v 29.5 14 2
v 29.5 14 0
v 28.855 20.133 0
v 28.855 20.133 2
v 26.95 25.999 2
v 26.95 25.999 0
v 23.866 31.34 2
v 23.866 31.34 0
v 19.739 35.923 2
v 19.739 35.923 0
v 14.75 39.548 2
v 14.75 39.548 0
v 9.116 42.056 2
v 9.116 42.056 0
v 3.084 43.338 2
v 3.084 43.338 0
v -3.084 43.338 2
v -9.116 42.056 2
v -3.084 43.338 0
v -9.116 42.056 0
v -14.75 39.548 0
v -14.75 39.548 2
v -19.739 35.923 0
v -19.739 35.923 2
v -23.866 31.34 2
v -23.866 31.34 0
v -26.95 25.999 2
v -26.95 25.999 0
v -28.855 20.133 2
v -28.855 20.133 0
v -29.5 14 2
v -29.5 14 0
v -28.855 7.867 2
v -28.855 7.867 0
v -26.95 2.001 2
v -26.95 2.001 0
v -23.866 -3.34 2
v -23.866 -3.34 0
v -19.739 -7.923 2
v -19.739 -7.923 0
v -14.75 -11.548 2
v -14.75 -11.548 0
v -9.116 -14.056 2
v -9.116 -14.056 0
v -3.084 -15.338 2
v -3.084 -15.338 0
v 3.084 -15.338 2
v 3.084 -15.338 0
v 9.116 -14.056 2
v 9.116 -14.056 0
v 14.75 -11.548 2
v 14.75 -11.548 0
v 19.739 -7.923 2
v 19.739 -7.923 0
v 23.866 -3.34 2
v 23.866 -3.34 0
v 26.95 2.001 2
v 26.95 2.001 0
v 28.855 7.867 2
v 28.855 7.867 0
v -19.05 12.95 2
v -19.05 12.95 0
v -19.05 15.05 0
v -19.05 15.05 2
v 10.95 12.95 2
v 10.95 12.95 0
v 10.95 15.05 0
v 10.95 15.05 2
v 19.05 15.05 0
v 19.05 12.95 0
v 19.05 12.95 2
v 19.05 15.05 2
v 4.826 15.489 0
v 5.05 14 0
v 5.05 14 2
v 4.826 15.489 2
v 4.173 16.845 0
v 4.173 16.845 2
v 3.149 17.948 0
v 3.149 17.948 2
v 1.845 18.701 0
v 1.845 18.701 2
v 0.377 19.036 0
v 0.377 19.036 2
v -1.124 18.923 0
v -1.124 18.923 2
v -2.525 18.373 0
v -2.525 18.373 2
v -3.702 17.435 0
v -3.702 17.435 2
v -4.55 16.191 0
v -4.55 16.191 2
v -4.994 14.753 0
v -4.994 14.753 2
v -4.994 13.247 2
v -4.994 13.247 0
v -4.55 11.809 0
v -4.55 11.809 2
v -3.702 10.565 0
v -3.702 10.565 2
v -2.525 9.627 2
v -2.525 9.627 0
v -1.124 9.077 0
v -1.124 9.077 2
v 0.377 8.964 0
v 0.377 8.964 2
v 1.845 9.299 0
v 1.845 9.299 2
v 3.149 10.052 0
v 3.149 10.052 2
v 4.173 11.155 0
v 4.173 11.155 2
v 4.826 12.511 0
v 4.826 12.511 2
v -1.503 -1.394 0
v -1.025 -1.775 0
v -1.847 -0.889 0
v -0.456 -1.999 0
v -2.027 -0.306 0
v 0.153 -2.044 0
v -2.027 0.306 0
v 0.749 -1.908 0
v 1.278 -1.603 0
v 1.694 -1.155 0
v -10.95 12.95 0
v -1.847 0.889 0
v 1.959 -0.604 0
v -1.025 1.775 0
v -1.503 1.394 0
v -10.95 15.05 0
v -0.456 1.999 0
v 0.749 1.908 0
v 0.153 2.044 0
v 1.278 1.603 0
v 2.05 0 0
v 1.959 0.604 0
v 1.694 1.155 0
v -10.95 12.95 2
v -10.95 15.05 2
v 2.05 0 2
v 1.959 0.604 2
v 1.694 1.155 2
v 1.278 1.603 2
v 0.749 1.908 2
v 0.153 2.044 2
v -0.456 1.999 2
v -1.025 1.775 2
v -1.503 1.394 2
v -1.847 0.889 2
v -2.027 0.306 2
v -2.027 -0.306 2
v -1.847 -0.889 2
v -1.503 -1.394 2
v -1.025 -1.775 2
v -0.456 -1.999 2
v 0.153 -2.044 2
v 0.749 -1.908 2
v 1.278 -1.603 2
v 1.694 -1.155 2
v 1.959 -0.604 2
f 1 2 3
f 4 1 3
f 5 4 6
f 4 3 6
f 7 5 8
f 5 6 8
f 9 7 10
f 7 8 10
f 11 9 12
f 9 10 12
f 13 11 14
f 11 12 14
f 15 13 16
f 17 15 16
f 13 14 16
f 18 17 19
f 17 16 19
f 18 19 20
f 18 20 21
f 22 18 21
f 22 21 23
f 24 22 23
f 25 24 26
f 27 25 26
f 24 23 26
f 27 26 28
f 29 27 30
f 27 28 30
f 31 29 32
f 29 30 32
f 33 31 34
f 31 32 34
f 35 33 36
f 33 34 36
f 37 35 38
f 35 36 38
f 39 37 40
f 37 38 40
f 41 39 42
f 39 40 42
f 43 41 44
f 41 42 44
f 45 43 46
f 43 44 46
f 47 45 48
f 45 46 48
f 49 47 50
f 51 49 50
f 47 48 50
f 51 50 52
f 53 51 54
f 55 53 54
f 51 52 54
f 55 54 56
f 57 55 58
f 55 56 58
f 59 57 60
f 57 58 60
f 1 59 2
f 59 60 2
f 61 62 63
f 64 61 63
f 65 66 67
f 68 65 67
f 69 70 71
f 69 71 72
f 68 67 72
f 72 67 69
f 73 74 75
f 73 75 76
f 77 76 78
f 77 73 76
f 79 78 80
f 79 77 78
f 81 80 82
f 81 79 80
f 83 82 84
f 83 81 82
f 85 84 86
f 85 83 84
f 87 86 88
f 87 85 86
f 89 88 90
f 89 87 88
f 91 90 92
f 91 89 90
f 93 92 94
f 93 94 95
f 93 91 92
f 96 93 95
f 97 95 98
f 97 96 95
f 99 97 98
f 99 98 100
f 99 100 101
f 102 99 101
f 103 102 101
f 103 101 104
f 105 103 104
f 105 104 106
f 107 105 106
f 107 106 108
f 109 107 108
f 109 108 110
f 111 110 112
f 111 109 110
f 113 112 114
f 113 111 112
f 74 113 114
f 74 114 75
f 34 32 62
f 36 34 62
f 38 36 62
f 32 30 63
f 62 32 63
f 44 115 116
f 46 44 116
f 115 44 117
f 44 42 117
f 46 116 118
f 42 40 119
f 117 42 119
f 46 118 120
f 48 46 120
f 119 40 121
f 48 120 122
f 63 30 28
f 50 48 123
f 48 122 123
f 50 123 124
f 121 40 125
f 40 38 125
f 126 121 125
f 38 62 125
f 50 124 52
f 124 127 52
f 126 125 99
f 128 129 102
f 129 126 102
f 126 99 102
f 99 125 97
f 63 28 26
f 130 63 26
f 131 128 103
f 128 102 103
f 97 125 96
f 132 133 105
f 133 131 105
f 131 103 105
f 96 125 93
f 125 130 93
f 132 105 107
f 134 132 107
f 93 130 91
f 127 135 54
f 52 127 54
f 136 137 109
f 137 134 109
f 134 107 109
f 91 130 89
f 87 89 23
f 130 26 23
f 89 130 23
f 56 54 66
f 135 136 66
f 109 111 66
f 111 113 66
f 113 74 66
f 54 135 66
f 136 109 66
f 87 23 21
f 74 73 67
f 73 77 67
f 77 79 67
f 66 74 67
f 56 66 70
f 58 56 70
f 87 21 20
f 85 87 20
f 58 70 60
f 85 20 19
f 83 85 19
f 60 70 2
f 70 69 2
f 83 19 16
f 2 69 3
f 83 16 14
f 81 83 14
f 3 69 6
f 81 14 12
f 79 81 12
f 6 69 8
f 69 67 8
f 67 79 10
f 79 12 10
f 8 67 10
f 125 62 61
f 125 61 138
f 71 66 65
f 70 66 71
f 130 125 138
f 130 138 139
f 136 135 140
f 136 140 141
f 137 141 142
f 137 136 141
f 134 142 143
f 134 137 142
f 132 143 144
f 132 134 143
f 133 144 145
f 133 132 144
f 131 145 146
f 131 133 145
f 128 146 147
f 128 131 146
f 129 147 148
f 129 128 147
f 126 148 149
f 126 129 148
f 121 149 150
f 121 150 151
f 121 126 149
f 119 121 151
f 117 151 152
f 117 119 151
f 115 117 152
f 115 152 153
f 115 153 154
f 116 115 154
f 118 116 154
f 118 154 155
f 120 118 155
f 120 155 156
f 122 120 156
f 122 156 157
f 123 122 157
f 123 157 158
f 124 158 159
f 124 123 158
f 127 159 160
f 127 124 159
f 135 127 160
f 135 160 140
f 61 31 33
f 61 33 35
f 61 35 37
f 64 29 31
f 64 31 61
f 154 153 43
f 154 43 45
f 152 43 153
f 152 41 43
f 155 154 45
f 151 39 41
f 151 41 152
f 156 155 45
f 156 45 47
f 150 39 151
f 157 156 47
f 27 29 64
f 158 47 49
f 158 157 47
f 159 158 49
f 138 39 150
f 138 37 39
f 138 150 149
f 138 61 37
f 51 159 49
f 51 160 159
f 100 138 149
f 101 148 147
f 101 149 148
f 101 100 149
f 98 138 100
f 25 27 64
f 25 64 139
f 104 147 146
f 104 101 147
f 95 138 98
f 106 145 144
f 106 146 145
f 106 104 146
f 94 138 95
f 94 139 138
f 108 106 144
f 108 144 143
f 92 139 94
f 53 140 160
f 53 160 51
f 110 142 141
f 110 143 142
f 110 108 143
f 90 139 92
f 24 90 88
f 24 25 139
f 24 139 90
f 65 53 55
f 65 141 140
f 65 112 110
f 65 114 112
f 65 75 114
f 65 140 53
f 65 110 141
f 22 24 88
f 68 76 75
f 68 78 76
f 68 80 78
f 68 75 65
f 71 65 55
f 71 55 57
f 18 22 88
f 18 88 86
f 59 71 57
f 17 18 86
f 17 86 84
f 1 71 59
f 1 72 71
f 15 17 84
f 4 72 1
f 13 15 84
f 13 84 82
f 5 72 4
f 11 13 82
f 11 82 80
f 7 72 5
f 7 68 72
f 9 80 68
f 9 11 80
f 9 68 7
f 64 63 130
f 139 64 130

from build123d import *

# Parameters (mm, degrees)
SKETCH_1_R      = 29.5
SKETCH_1_R_2    = 2.05
SKETCH_1_R_3    = 5.05
SKETCH_1_W      = 8.1
SKETCH_1_H      = 2.1
EXTRUDE_1_DEPTH = 2


with BuildPart() as part:
    # 草图1 → 凸台-拉伸1 (new body)
    with BuildSketch(Plane.XY):
        with Locations((0, 14)):
            Circle(SKETCH_1_R)
        Circle(SKETCH_1_R_2, mode=Mode.SUBTRACT)
        with Locations((0, 14)):
            Circle(SKETCH_1_R_3, mode=Mode.SUBTRACT)
        with Locations((-15, 14)):
            Rectangle(SKETCH_1_W, SKETCH_1_H, mode=Mode.SUBTRACT)
        with Locations((15, 14)):
            Rectangle(SKETCH_1_W, SKETCH_1_H, mode=Mode.SUBTRACT)
    extrude(amount=EXTRUDE_1_DEPTH)


solid = part.part
